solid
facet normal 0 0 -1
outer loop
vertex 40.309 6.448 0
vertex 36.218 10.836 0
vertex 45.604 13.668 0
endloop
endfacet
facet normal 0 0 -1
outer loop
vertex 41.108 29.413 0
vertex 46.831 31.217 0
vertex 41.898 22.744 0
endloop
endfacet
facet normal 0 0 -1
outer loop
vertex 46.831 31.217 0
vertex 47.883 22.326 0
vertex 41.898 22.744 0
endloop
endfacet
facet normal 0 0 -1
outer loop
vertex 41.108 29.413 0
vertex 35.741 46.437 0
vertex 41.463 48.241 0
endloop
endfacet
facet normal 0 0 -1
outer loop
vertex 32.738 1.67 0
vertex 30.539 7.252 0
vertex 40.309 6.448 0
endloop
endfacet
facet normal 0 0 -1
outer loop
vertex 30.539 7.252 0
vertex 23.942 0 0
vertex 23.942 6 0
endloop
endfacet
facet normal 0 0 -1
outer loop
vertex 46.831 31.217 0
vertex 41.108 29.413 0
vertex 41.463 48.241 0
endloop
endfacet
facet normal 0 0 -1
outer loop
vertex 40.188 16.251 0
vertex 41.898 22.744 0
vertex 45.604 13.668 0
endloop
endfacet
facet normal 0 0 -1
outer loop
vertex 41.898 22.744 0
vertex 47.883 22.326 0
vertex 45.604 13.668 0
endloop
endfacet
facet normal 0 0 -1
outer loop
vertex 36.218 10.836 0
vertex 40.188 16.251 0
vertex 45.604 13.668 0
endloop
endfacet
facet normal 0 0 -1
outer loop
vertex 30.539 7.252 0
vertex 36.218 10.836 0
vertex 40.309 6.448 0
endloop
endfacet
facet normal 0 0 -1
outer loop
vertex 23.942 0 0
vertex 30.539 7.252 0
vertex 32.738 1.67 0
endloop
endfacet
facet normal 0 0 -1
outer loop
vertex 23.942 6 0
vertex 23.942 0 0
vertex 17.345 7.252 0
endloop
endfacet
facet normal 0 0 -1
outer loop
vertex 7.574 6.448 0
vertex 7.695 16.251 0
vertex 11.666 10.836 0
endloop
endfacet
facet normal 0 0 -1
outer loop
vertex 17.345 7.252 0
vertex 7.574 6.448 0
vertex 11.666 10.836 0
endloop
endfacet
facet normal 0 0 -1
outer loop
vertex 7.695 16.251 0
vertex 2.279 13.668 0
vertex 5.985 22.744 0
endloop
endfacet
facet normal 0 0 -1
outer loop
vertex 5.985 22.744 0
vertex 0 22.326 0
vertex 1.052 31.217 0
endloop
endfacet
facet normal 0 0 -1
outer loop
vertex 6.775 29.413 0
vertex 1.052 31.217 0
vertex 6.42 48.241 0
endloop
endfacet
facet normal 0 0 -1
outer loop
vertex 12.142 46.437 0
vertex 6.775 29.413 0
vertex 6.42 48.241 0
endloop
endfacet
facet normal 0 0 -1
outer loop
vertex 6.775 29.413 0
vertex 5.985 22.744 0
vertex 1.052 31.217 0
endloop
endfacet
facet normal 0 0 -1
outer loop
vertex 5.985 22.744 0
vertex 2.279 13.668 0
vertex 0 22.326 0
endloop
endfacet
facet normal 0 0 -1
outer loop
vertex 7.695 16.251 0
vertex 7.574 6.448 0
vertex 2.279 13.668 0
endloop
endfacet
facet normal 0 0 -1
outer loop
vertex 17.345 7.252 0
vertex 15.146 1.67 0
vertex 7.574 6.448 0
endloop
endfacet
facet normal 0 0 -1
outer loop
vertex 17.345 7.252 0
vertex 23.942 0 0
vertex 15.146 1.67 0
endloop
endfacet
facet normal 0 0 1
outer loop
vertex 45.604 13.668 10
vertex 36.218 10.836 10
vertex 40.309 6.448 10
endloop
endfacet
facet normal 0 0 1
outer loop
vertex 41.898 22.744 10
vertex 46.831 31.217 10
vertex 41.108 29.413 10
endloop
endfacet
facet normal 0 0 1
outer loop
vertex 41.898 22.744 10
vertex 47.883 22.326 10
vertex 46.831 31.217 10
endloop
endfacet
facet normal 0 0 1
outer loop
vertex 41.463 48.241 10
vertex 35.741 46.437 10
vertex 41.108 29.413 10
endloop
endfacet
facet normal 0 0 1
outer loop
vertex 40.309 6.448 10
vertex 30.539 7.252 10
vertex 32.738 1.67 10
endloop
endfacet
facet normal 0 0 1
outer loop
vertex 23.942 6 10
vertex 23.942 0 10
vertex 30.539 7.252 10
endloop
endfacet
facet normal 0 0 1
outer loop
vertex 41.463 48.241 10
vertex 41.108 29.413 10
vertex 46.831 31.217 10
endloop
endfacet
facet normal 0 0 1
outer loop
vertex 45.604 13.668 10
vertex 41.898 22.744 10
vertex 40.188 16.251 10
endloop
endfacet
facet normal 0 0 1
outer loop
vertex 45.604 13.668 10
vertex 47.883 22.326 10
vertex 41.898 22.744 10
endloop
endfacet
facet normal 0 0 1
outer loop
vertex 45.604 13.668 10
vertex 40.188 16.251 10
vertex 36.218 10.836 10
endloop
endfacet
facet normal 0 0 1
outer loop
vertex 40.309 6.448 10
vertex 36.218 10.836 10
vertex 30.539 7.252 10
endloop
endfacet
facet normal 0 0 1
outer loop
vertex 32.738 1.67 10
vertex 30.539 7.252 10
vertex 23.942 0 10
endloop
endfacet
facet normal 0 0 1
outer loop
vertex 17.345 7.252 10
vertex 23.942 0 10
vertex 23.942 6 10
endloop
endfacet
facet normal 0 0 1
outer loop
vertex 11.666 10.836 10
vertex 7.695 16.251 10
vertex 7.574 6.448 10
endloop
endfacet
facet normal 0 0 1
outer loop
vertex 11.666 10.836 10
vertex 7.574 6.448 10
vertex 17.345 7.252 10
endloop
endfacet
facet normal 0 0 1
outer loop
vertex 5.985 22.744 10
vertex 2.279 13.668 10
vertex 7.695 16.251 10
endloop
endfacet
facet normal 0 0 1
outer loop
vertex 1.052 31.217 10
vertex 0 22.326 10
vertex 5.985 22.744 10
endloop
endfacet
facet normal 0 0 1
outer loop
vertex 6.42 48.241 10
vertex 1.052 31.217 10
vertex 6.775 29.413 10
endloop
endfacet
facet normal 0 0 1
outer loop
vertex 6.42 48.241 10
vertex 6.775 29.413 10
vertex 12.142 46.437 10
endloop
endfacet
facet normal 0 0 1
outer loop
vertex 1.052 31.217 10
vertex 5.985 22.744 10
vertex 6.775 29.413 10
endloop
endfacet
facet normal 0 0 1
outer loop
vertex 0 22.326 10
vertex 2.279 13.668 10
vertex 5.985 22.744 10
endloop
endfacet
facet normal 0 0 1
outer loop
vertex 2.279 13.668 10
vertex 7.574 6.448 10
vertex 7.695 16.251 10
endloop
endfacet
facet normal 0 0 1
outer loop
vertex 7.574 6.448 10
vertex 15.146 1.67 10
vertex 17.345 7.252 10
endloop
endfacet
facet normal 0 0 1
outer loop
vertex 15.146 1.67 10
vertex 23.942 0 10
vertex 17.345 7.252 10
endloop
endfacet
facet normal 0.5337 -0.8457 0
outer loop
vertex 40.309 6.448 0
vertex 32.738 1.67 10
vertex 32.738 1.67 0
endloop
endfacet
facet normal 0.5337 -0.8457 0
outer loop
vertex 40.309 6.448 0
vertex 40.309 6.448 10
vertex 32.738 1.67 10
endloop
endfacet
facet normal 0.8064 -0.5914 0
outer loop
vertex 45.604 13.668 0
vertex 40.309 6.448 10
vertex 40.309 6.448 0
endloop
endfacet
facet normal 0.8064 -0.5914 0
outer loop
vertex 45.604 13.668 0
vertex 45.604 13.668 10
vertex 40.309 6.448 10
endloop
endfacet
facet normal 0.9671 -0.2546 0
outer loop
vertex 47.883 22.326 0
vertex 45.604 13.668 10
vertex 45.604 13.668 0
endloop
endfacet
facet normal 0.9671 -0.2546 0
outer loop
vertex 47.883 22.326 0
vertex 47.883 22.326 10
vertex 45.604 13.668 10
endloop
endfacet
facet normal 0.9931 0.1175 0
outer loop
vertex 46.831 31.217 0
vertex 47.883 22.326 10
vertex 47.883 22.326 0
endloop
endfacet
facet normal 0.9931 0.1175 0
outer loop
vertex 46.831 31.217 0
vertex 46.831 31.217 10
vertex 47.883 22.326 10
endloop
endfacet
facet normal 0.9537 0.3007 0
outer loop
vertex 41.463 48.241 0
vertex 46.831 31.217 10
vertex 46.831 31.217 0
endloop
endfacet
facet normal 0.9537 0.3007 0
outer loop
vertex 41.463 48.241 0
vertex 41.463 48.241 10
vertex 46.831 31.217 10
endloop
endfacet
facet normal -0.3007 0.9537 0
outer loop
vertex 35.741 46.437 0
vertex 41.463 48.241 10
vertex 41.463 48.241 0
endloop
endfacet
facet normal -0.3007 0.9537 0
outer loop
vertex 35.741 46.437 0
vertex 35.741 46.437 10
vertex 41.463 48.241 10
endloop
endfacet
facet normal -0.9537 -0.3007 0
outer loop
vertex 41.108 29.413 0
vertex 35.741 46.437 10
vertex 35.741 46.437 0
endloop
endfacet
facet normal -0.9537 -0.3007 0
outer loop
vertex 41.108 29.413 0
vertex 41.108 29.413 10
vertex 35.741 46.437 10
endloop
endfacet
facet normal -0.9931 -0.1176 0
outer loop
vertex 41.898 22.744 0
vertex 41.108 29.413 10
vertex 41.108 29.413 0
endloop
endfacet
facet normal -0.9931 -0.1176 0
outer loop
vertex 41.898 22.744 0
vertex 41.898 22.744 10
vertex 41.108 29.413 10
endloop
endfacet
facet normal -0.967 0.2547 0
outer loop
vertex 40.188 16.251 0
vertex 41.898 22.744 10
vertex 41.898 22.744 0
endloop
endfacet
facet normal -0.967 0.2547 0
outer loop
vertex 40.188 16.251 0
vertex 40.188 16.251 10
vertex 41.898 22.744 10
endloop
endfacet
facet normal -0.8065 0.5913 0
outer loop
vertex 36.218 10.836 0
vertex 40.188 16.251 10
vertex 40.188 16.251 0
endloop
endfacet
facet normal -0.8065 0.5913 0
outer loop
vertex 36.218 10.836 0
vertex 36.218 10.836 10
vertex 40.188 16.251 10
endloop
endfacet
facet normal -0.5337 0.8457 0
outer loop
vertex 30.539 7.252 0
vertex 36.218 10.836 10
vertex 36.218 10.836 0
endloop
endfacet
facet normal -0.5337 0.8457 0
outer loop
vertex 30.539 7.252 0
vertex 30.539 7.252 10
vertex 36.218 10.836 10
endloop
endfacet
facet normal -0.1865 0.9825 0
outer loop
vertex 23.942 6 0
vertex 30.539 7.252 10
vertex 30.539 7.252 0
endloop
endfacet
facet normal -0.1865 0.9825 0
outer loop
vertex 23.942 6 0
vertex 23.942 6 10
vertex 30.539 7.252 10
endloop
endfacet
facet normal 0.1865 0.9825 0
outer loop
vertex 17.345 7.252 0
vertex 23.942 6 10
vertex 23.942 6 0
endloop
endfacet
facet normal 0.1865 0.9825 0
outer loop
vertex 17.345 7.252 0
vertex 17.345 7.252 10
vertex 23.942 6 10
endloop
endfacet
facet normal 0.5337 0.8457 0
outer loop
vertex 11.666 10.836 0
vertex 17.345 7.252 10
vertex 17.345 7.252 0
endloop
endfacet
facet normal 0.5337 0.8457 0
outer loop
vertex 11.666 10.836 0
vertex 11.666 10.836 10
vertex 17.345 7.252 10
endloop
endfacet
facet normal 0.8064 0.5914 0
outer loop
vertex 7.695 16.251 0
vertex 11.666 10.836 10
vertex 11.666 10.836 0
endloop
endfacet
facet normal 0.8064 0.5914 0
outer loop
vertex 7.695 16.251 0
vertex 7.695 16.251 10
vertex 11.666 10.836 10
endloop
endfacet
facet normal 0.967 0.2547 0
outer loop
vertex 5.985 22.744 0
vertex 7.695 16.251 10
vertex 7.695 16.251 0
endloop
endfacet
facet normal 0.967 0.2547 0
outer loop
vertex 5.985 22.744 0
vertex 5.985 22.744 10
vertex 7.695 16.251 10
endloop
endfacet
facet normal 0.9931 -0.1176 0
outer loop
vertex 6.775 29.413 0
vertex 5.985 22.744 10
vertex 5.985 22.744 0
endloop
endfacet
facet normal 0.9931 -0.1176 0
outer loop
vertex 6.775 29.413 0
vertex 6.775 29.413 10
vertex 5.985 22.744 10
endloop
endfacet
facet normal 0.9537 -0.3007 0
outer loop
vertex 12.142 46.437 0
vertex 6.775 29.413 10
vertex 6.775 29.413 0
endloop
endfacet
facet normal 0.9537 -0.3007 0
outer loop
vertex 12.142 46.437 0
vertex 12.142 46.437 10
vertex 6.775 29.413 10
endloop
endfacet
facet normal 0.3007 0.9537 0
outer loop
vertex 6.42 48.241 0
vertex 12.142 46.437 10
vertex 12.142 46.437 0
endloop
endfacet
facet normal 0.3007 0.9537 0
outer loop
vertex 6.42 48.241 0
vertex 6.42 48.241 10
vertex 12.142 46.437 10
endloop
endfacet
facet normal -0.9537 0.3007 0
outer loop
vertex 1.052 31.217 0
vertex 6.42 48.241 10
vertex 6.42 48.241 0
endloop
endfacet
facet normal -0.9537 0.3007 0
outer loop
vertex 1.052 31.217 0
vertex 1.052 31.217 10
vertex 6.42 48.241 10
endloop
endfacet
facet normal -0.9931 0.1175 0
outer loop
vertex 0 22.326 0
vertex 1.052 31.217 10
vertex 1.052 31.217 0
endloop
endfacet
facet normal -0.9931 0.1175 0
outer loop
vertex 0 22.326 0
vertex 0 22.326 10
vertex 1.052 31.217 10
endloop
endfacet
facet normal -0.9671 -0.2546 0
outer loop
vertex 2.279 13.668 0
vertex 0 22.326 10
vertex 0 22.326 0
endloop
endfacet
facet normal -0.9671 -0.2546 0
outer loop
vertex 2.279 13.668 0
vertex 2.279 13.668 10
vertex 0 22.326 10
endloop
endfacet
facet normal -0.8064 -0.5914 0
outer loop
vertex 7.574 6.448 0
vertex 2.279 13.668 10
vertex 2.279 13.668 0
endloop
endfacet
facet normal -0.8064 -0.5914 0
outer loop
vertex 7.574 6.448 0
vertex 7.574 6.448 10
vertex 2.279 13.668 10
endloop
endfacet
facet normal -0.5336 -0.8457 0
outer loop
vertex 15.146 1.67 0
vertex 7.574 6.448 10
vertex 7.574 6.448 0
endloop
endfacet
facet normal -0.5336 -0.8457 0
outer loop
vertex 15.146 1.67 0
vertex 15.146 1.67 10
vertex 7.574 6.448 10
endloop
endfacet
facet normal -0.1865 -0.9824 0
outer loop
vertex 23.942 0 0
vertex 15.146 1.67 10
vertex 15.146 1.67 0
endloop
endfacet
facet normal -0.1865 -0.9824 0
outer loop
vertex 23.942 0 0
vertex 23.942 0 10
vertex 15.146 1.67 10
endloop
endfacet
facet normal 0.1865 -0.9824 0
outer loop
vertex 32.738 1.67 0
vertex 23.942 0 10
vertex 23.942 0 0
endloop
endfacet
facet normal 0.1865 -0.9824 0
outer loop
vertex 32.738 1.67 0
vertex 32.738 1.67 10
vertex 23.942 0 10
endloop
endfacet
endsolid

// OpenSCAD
$fn = 32;

// ----------------------------------------------------------------------
// Clip blank: omega clip, 10 mm thick
// ----------------------------------------------------------------------

// --- parameters (mm) ---
profile_height = 10;      // extrusion height
profile_points = 26;      // points of the closed outline

profile = [[1.052, 31.217], [0, 22.326], [2.279, 13.668], [7.574, 6.448], [15.146, 1.67], [23.942, 0], [32.738, 1.67], [40.309, 6.448], [45.604, 13.668], [47.883, 22.326], [46.831, 31.217], [41.463, 48.241], [35.741, 46.437], [41.108, 29.413], [41.898, 22.744], [40.188, 16.251], [36.218, 10.836], [30.539, 7.252], [23.942, 6], [17.345, 7.252], [11.666, 10.836], [7.695, 16.251], [5.985, 22.744], [6.775, 29.413], [12.142, 46.437], [6.42, 48.241]];  // single closed polygon, 26 points, counter clockwise

// --- the one profile operation ---
linear_extrude(height = profile_height) polygon(points = profile);
